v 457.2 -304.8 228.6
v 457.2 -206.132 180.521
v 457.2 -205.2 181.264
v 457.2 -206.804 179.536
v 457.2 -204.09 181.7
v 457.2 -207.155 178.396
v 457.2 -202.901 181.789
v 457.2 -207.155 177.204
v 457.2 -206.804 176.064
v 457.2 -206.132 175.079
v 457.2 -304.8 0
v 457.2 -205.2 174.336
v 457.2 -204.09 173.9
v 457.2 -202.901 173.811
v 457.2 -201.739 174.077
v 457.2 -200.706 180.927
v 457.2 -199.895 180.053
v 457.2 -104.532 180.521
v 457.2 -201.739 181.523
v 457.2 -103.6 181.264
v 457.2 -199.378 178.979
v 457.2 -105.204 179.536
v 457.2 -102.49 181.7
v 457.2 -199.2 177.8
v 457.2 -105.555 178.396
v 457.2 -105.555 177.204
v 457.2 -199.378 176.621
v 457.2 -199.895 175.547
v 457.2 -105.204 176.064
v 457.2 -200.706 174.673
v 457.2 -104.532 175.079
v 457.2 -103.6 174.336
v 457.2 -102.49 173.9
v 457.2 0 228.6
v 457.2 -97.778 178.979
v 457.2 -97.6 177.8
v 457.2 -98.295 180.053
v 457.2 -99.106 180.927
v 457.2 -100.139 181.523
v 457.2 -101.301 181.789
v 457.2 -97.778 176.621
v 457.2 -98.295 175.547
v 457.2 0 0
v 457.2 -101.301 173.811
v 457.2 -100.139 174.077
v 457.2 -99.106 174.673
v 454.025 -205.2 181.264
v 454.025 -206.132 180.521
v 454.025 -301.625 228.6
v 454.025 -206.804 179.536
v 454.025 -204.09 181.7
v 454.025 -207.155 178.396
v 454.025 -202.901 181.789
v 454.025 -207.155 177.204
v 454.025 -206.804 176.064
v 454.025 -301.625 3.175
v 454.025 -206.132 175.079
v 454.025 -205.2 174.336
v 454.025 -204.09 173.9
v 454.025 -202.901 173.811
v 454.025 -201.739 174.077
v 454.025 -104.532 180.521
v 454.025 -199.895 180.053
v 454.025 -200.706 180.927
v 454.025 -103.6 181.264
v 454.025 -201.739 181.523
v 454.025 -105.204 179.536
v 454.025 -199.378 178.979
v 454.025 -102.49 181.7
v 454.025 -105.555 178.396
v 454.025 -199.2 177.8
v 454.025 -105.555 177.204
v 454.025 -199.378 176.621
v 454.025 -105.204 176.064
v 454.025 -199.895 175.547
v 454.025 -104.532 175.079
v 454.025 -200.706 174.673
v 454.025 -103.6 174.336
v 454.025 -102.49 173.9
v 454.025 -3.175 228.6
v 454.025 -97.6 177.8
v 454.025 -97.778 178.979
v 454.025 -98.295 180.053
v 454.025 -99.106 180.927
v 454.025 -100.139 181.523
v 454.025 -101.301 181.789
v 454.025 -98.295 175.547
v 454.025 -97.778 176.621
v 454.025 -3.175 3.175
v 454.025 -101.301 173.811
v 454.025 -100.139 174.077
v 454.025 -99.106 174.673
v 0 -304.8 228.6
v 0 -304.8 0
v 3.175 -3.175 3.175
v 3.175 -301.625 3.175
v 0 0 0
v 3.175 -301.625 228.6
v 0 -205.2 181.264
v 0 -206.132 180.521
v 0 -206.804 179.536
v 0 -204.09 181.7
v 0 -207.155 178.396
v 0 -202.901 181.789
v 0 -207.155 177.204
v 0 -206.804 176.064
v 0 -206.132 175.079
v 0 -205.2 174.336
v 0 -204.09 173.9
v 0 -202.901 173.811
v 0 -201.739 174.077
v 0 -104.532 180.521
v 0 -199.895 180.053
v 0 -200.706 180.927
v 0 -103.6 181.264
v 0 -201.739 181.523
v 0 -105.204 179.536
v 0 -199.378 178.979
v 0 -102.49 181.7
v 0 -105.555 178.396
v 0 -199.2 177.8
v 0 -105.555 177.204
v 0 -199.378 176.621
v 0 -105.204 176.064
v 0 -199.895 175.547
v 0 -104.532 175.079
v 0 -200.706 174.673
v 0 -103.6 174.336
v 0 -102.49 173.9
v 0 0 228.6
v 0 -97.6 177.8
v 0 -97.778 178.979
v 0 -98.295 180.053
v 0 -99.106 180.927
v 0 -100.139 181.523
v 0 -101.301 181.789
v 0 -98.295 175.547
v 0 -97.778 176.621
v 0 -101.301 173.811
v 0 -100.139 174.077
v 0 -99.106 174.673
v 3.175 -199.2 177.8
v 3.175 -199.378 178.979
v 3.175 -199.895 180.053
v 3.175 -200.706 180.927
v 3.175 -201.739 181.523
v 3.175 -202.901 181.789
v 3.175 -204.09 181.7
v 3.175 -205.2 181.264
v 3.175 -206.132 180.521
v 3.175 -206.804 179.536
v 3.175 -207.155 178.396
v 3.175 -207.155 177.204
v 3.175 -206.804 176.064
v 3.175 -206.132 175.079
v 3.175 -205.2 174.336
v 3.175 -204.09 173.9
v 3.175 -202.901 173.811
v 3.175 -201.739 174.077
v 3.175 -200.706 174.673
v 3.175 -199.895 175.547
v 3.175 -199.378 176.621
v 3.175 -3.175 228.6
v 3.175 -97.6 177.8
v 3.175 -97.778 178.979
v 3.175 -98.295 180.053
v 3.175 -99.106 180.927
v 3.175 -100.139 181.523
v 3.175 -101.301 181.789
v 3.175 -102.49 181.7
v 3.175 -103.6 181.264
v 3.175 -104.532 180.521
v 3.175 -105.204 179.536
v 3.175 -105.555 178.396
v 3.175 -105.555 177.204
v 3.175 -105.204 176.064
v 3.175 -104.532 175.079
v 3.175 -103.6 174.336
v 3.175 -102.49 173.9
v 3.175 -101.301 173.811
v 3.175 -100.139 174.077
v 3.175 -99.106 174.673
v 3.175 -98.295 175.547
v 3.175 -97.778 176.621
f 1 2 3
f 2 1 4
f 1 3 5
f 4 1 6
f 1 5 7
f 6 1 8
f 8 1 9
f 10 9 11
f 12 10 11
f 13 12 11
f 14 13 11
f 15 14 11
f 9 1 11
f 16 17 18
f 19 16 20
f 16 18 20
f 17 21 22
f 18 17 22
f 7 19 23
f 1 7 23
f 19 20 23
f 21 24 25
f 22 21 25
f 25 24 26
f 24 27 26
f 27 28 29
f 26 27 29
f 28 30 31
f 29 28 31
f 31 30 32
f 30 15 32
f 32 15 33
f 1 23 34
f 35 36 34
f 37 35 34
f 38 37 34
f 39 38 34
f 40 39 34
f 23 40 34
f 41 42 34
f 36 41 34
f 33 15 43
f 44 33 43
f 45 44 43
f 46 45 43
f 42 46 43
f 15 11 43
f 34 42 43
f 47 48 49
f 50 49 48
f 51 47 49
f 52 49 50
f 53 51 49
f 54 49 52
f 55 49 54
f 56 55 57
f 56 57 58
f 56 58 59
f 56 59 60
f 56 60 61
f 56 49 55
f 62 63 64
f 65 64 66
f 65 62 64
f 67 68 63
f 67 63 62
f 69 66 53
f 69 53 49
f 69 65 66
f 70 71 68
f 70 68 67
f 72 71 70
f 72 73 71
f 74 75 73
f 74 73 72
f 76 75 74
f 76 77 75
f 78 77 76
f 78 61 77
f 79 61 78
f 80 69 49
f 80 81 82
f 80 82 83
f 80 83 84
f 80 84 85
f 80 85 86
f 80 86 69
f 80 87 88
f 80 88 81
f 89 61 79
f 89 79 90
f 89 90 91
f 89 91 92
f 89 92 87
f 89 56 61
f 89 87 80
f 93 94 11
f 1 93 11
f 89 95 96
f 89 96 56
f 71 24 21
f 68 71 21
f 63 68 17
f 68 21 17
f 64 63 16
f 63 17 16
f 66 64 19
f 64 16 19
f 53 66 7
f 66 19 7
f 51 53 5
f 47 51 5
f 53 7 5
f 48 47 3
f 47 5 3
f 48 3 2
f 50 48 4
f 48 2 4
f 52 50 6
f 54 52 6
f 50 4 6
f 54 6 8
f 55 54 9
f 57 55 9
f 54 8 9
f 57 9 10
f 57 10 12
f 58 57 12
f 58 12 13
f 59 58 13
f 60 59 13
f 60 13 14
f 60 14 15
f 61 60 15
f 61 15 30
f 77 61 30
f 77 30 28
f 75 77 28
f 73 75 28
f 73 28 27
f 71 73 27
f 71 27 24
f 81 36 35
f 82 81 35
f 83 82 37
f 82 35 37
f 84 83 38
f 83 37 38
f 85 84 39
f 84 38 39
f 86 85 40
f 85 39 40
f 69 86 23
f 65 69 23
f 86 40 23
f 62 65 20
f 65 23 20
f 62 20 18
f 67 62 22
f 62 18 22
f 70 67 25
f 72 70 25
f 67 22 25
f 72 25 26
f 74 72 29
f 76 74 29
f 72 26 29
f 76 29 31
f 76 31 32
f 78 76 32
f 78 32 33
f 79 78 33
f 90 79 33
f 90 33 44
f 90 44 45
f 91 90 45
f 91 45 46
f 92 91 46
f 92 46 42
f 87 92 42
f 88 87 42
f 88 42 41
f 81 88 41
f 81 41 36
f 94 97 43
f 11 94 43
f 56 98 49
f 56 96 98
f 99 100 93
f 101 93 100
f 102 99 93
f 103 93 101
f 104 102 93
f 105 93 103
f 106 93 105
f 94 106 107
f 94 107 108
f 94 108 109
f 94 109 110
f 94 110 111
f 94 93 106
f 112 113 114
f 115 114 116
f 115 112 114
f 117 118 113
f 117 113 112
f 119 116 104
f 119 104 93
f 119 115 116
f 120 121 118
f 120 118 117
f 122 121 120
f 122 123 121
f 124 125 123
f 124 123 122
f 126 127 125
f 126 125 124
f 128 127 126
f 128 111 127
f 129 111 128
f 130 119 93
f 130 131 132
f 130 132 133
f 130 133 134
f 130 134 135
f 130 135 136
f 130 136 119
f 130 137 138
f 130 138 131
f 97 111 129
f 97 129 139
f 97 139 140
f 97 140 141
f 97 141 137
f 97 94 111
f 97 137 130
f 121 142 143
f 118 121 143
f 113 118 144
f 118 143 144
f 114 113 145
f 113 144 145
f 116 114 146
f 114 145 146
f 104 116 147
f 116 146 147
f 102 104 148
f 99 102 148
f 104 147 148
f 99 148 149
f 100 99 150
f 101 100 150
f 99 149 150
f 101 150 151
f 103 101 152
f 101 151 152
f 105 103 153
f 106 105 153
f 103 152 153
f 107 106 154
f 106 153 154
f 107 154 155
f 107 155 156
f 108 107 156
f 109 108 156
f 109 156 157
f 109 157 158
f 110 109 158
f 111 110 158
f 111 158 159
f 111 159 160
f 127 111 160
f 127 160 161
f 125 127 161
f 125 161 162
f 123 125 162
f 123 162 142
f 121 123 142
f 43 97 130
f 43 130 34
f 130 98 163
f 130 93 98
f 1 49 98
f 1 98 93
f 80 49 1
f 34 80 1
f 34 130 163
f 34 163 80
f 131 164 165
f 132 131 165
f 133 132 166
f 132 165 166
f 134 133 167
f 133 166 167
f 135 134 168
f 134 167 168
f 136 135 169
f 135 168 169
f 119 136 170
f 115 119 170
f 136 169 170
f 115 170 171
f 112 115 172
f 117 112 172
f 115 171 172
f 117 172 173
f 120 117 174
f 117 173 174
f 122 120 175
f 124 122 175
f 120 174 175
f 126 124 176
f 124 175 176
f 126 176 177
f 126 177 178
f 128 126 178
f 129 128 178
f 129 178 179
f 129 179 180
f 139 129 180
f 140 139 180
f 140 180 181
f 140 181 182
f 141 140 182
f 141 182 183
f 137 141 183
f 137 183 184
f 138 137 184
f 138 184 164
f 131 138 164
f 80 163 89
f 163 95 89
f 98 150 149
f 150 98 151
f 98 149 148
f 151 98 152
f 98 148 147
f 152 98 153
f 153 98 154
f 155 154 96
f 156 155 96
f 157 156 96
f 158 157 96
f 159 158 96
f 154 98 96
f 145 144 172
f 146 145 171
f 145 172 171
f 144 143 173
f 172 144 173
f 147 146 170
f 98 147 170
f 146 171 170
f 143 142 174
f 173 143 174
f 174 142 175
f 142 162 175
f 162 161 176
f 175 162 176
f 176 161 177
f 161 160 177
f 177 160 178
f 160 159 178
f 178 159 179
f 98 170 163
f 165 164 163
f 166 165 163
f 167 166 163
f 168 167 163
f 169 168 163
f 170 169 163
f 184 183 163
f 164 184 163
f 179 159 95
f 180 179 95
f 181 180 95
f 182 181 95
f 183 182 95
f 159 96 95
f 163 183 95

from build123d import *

# Parameters (mm, degrees)
F0_W     = 457.2
F0_H     = 304.8
F1_DEPTH = 228.6
F2_T     = -3.175
F4_D     = 8


with BuildPart() as f1:
    # F0 (on Top) → F1 (new body)
    with BuildSketch(Plane.XY):
        with Locations((228.6, -152.4)):
            Rectangle(F0_W, F0_H)
    extrude(amount=F1_DEPTH)

    # F2
    f2_openings = [f1.faces().sort_by_distance(p)[0] for p in [
        (228.6, -152.4, 228.6),
    ]]
    offset(amount=F2_T, openings=f2_openings)

    # F4 (through all)
    with Locations(Plane(origin=(0, 0, 0), x_dir=(0, -1, 0), z_dir=(-1, 0, 0))):
        with Locations((203.2, 177.8), (101.6, 177.8)):
            Hole(F4_D / 2)


solid = f1.part
